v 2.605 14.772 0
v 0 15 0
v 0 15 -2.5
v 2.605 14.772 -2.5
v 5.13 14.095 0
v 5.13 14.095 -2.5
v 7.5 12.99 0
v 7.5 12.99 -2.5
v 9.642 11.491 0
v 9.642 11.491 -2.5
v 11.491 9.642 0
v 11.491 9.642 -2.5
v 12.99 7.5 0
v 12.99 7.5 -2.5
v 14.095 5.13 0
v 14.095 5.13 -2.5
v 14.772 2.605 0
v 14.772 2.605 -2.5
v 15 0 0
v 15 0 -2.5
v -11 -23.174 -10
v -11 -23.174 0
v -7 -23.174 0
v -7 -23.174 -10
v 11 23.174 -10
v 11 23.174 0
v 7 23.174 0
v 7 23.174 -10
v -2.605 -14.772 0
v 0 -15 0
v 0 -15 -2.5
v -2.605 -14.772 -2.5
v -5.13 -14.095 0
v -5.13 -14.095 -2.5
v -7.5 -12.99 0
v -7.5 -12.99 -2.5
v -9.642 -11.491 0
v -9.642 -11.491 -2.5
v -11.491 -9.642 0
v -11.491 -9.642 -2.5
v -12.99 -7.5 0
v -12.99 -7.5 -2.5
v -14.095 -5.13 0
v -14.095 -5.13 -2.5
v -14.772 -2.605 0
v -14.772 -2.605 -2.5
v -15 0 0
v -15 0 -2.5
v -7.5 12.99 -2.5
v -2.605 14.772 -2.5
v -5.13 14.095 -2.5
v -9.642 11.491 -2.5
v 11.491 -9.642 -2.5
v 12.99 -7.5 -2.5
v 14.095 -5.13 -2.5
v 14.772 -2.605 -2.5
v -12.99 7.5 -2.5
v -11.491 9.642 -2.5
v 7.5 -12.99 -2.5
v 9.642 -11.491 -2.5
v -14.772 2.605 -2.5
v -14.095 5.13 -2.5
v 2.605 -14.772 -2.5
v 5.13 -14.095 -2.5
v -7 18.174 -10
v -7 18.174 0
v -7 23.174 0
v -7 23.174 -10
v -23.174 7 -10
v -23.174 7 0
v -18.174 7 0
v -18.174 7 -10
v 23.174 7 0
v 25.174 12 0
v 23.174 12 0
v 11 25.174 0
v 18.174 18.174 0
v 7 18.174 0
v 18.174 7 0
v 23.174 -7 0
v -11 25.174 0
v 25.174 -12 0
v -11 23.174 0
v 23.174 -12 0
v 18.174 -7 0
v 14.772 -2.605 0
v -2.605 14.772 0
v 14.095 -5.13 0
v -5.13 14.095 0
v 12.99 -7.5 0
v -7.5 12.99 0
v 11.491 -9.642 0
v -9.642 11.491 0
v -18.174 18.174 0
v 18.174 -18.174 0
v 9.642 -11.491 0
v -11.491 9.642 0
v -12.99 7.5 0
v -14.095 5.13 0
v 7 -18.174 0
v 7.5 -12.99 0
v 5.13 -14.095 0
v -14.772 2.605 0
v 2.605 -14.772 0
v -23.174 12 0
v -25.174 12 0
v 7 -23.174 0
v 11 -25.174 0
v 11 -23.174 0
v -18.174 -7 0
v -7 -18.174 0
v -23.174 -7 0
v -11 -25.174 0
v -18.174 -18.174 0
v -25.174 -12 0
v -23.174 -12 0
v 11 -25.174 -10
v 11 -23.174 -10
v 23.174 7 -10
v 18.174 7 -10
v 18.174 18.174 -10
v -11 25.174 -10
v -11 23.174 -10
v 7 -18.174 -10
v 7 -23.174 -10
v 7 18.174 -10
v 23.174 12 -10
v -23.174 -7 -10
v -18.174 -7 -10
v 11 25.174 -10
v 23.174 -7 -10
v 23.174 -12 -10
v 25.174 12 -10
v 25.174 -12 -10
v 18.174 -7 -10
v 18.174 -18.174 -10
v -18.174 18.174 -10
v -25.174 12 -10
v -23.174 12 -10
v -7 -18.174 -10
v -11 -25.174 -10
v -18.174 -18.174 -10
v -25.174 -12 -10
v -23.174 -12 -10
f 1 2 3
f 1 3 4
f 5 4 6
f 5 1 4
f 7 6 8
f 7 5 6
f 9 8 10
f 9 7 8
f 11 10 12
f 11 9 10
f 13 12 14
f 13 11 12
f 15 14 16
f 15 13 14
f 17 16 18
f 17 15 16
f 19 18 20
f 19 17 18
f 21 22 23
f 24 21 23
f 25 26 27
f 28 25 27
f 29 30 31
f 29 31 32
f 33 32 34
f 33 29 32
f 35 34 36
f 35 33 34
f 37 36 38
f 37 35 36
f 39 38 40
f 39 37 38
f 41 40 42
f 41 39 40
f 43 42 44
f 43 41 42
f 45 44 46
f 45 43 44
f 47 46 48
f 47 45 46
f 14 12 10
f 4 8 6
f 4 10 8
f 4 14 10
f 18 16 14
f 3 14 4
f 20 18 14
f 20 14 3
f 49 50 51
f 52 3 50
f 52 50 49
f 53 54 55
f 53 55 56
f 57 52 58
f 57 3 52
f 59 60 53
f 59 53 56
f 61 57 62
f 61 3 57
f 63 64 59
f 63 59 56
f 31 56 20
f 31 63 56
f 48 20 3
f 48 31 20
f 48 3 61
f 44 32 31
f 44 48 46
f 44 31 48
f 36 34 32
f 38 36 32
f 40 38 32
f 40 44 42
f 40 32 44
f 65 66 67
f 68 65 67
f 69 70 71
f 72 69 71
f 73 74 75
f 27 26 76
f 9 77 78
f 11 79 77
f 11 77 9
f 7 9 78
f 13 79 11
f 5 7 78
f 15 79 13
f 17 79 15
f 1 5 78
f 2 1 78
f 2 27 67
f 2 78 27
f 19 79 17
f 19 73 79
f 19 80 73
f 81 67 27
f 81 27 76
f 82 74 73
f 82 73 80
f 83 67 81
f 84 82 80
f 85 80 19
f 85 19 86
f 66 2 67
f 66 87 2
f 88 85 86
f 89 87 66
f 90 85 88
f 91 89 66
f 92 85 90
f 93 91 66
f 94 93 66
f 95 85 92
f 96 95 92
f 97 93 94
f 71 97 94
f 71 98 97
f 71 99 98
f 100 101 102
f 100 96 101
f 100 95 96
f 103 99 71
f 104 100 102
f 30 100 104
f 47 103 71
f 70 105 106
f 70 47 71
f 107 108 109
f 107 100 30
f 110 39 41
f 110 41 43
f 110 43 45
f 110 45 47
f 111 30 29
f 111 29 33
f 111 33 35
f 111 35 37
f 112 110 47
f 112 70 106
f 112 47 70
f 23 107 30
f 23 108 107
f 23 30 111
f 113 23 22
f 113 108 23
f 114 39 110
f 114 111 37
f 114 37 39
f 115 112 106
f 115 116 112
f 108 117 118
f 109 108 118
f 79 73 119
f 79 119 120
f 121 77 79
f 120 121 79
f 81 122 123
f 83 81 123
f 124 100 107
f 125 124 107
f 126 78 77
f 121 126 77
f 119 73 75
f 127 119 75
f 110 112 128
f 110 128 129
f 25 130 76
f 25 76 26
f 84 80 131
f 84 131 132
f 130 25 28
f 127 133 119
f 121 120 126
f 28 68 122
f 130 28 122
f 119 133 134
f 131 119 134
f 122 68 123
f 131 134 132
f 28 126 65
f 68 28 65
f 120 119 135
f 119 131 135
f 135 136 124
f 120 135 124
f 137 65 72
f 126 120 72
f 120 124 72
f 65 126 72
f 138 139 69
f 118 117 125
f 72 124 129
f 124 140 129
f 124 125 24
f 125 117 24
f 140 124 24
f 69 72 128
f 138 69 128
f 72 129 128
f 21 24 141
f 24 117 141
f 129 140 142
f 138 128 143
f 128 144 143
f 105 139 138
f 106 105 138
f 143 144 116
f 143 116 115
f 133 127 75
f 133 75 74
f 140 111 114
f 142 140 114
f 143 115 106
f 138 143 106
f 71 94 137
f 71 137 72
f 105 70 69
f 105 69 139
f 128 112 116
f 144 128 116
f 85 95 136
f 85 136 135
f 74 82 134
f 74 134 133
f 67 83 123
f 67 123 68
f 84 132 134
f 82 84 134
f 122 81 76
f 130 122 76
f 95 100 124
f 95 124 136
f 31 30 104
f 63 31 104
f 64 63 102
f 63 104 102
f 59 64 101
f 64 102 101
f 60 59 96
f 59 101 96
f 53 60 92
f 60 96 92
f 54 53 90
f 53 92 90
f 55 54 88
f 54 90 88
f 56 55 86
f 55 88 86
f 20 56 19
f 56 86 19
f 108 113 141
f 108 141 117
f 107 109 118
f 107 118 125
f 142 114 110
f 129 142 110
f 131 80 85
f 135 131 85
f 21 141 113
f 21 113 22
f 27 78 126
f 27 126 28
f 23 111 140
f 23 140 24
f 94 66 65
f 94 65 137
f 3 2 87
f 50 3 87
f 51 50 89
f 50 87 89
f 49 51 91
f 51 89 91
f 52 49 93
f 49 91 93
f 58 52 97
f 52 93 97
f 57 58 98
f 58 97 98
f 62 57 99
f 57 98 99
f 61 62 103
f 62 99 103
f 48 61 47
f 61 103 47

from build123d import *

# Parameters (mm, degrees)
F0_W     = 7
F0_H     = 5
F0_W_2   = 5
F0_H_2   = 7
F1_DEPTH = 10
F3_DEPTH = 2.5


with BuildPart() as f1:
    # F0 (on Top) → F1 (new body)
    with BuildSketch(Plane.XY):
        Polygon((0, 0), (0, 18.174312), (-7, 18.174312), (-18.174312, 18.174312), (-18.174312, 7), (-18.174312, 0), align=None)
        with Locations((-3.5, 20.674312)):
            Rectangle(F0_W, F0_H)
        Polygon((-7, 23.174312), (0, 23.174312), (0, 25.174312), (-11, 25.174312), (-11, 23.174312), align=None)
        with Locations((-20.674312, 3.5)):
            Rectangle(F0_W_2, F0_H_2)
        Polygon((-25.174312, 0), (-23.174312, 0), (-23.174312, 7), (-23.174312, 12), (-25.174312, 12), align=None)
    extrude(amount=-F1_DEPTH)

    # F2 (on face) → F3 (cut)
    with BuildSketch(Plane.XY):
        with BuildLine():
            Line((0, 0), (0, 15))
            ThreePointArc((0, 15), (-10.606602, 10.606602), (-15, 0))
            Line((-15, 0), (0, 0))
        make_face()
    extrude(amount=-F3_DEPTH, mode=Mode.SUBTRACT)

    # F4: F1 across plane


with BuildPart() as f1_1:
    add(f1.part)
    add(f1.part.mirror(Plane.YZ))

    # F5: F1 across plane


with BuildPart() as f1_2:
    add(f1_1.part)
    add(f1_1.part.mirror(Plane.XZ))


solid = f1_2.part
